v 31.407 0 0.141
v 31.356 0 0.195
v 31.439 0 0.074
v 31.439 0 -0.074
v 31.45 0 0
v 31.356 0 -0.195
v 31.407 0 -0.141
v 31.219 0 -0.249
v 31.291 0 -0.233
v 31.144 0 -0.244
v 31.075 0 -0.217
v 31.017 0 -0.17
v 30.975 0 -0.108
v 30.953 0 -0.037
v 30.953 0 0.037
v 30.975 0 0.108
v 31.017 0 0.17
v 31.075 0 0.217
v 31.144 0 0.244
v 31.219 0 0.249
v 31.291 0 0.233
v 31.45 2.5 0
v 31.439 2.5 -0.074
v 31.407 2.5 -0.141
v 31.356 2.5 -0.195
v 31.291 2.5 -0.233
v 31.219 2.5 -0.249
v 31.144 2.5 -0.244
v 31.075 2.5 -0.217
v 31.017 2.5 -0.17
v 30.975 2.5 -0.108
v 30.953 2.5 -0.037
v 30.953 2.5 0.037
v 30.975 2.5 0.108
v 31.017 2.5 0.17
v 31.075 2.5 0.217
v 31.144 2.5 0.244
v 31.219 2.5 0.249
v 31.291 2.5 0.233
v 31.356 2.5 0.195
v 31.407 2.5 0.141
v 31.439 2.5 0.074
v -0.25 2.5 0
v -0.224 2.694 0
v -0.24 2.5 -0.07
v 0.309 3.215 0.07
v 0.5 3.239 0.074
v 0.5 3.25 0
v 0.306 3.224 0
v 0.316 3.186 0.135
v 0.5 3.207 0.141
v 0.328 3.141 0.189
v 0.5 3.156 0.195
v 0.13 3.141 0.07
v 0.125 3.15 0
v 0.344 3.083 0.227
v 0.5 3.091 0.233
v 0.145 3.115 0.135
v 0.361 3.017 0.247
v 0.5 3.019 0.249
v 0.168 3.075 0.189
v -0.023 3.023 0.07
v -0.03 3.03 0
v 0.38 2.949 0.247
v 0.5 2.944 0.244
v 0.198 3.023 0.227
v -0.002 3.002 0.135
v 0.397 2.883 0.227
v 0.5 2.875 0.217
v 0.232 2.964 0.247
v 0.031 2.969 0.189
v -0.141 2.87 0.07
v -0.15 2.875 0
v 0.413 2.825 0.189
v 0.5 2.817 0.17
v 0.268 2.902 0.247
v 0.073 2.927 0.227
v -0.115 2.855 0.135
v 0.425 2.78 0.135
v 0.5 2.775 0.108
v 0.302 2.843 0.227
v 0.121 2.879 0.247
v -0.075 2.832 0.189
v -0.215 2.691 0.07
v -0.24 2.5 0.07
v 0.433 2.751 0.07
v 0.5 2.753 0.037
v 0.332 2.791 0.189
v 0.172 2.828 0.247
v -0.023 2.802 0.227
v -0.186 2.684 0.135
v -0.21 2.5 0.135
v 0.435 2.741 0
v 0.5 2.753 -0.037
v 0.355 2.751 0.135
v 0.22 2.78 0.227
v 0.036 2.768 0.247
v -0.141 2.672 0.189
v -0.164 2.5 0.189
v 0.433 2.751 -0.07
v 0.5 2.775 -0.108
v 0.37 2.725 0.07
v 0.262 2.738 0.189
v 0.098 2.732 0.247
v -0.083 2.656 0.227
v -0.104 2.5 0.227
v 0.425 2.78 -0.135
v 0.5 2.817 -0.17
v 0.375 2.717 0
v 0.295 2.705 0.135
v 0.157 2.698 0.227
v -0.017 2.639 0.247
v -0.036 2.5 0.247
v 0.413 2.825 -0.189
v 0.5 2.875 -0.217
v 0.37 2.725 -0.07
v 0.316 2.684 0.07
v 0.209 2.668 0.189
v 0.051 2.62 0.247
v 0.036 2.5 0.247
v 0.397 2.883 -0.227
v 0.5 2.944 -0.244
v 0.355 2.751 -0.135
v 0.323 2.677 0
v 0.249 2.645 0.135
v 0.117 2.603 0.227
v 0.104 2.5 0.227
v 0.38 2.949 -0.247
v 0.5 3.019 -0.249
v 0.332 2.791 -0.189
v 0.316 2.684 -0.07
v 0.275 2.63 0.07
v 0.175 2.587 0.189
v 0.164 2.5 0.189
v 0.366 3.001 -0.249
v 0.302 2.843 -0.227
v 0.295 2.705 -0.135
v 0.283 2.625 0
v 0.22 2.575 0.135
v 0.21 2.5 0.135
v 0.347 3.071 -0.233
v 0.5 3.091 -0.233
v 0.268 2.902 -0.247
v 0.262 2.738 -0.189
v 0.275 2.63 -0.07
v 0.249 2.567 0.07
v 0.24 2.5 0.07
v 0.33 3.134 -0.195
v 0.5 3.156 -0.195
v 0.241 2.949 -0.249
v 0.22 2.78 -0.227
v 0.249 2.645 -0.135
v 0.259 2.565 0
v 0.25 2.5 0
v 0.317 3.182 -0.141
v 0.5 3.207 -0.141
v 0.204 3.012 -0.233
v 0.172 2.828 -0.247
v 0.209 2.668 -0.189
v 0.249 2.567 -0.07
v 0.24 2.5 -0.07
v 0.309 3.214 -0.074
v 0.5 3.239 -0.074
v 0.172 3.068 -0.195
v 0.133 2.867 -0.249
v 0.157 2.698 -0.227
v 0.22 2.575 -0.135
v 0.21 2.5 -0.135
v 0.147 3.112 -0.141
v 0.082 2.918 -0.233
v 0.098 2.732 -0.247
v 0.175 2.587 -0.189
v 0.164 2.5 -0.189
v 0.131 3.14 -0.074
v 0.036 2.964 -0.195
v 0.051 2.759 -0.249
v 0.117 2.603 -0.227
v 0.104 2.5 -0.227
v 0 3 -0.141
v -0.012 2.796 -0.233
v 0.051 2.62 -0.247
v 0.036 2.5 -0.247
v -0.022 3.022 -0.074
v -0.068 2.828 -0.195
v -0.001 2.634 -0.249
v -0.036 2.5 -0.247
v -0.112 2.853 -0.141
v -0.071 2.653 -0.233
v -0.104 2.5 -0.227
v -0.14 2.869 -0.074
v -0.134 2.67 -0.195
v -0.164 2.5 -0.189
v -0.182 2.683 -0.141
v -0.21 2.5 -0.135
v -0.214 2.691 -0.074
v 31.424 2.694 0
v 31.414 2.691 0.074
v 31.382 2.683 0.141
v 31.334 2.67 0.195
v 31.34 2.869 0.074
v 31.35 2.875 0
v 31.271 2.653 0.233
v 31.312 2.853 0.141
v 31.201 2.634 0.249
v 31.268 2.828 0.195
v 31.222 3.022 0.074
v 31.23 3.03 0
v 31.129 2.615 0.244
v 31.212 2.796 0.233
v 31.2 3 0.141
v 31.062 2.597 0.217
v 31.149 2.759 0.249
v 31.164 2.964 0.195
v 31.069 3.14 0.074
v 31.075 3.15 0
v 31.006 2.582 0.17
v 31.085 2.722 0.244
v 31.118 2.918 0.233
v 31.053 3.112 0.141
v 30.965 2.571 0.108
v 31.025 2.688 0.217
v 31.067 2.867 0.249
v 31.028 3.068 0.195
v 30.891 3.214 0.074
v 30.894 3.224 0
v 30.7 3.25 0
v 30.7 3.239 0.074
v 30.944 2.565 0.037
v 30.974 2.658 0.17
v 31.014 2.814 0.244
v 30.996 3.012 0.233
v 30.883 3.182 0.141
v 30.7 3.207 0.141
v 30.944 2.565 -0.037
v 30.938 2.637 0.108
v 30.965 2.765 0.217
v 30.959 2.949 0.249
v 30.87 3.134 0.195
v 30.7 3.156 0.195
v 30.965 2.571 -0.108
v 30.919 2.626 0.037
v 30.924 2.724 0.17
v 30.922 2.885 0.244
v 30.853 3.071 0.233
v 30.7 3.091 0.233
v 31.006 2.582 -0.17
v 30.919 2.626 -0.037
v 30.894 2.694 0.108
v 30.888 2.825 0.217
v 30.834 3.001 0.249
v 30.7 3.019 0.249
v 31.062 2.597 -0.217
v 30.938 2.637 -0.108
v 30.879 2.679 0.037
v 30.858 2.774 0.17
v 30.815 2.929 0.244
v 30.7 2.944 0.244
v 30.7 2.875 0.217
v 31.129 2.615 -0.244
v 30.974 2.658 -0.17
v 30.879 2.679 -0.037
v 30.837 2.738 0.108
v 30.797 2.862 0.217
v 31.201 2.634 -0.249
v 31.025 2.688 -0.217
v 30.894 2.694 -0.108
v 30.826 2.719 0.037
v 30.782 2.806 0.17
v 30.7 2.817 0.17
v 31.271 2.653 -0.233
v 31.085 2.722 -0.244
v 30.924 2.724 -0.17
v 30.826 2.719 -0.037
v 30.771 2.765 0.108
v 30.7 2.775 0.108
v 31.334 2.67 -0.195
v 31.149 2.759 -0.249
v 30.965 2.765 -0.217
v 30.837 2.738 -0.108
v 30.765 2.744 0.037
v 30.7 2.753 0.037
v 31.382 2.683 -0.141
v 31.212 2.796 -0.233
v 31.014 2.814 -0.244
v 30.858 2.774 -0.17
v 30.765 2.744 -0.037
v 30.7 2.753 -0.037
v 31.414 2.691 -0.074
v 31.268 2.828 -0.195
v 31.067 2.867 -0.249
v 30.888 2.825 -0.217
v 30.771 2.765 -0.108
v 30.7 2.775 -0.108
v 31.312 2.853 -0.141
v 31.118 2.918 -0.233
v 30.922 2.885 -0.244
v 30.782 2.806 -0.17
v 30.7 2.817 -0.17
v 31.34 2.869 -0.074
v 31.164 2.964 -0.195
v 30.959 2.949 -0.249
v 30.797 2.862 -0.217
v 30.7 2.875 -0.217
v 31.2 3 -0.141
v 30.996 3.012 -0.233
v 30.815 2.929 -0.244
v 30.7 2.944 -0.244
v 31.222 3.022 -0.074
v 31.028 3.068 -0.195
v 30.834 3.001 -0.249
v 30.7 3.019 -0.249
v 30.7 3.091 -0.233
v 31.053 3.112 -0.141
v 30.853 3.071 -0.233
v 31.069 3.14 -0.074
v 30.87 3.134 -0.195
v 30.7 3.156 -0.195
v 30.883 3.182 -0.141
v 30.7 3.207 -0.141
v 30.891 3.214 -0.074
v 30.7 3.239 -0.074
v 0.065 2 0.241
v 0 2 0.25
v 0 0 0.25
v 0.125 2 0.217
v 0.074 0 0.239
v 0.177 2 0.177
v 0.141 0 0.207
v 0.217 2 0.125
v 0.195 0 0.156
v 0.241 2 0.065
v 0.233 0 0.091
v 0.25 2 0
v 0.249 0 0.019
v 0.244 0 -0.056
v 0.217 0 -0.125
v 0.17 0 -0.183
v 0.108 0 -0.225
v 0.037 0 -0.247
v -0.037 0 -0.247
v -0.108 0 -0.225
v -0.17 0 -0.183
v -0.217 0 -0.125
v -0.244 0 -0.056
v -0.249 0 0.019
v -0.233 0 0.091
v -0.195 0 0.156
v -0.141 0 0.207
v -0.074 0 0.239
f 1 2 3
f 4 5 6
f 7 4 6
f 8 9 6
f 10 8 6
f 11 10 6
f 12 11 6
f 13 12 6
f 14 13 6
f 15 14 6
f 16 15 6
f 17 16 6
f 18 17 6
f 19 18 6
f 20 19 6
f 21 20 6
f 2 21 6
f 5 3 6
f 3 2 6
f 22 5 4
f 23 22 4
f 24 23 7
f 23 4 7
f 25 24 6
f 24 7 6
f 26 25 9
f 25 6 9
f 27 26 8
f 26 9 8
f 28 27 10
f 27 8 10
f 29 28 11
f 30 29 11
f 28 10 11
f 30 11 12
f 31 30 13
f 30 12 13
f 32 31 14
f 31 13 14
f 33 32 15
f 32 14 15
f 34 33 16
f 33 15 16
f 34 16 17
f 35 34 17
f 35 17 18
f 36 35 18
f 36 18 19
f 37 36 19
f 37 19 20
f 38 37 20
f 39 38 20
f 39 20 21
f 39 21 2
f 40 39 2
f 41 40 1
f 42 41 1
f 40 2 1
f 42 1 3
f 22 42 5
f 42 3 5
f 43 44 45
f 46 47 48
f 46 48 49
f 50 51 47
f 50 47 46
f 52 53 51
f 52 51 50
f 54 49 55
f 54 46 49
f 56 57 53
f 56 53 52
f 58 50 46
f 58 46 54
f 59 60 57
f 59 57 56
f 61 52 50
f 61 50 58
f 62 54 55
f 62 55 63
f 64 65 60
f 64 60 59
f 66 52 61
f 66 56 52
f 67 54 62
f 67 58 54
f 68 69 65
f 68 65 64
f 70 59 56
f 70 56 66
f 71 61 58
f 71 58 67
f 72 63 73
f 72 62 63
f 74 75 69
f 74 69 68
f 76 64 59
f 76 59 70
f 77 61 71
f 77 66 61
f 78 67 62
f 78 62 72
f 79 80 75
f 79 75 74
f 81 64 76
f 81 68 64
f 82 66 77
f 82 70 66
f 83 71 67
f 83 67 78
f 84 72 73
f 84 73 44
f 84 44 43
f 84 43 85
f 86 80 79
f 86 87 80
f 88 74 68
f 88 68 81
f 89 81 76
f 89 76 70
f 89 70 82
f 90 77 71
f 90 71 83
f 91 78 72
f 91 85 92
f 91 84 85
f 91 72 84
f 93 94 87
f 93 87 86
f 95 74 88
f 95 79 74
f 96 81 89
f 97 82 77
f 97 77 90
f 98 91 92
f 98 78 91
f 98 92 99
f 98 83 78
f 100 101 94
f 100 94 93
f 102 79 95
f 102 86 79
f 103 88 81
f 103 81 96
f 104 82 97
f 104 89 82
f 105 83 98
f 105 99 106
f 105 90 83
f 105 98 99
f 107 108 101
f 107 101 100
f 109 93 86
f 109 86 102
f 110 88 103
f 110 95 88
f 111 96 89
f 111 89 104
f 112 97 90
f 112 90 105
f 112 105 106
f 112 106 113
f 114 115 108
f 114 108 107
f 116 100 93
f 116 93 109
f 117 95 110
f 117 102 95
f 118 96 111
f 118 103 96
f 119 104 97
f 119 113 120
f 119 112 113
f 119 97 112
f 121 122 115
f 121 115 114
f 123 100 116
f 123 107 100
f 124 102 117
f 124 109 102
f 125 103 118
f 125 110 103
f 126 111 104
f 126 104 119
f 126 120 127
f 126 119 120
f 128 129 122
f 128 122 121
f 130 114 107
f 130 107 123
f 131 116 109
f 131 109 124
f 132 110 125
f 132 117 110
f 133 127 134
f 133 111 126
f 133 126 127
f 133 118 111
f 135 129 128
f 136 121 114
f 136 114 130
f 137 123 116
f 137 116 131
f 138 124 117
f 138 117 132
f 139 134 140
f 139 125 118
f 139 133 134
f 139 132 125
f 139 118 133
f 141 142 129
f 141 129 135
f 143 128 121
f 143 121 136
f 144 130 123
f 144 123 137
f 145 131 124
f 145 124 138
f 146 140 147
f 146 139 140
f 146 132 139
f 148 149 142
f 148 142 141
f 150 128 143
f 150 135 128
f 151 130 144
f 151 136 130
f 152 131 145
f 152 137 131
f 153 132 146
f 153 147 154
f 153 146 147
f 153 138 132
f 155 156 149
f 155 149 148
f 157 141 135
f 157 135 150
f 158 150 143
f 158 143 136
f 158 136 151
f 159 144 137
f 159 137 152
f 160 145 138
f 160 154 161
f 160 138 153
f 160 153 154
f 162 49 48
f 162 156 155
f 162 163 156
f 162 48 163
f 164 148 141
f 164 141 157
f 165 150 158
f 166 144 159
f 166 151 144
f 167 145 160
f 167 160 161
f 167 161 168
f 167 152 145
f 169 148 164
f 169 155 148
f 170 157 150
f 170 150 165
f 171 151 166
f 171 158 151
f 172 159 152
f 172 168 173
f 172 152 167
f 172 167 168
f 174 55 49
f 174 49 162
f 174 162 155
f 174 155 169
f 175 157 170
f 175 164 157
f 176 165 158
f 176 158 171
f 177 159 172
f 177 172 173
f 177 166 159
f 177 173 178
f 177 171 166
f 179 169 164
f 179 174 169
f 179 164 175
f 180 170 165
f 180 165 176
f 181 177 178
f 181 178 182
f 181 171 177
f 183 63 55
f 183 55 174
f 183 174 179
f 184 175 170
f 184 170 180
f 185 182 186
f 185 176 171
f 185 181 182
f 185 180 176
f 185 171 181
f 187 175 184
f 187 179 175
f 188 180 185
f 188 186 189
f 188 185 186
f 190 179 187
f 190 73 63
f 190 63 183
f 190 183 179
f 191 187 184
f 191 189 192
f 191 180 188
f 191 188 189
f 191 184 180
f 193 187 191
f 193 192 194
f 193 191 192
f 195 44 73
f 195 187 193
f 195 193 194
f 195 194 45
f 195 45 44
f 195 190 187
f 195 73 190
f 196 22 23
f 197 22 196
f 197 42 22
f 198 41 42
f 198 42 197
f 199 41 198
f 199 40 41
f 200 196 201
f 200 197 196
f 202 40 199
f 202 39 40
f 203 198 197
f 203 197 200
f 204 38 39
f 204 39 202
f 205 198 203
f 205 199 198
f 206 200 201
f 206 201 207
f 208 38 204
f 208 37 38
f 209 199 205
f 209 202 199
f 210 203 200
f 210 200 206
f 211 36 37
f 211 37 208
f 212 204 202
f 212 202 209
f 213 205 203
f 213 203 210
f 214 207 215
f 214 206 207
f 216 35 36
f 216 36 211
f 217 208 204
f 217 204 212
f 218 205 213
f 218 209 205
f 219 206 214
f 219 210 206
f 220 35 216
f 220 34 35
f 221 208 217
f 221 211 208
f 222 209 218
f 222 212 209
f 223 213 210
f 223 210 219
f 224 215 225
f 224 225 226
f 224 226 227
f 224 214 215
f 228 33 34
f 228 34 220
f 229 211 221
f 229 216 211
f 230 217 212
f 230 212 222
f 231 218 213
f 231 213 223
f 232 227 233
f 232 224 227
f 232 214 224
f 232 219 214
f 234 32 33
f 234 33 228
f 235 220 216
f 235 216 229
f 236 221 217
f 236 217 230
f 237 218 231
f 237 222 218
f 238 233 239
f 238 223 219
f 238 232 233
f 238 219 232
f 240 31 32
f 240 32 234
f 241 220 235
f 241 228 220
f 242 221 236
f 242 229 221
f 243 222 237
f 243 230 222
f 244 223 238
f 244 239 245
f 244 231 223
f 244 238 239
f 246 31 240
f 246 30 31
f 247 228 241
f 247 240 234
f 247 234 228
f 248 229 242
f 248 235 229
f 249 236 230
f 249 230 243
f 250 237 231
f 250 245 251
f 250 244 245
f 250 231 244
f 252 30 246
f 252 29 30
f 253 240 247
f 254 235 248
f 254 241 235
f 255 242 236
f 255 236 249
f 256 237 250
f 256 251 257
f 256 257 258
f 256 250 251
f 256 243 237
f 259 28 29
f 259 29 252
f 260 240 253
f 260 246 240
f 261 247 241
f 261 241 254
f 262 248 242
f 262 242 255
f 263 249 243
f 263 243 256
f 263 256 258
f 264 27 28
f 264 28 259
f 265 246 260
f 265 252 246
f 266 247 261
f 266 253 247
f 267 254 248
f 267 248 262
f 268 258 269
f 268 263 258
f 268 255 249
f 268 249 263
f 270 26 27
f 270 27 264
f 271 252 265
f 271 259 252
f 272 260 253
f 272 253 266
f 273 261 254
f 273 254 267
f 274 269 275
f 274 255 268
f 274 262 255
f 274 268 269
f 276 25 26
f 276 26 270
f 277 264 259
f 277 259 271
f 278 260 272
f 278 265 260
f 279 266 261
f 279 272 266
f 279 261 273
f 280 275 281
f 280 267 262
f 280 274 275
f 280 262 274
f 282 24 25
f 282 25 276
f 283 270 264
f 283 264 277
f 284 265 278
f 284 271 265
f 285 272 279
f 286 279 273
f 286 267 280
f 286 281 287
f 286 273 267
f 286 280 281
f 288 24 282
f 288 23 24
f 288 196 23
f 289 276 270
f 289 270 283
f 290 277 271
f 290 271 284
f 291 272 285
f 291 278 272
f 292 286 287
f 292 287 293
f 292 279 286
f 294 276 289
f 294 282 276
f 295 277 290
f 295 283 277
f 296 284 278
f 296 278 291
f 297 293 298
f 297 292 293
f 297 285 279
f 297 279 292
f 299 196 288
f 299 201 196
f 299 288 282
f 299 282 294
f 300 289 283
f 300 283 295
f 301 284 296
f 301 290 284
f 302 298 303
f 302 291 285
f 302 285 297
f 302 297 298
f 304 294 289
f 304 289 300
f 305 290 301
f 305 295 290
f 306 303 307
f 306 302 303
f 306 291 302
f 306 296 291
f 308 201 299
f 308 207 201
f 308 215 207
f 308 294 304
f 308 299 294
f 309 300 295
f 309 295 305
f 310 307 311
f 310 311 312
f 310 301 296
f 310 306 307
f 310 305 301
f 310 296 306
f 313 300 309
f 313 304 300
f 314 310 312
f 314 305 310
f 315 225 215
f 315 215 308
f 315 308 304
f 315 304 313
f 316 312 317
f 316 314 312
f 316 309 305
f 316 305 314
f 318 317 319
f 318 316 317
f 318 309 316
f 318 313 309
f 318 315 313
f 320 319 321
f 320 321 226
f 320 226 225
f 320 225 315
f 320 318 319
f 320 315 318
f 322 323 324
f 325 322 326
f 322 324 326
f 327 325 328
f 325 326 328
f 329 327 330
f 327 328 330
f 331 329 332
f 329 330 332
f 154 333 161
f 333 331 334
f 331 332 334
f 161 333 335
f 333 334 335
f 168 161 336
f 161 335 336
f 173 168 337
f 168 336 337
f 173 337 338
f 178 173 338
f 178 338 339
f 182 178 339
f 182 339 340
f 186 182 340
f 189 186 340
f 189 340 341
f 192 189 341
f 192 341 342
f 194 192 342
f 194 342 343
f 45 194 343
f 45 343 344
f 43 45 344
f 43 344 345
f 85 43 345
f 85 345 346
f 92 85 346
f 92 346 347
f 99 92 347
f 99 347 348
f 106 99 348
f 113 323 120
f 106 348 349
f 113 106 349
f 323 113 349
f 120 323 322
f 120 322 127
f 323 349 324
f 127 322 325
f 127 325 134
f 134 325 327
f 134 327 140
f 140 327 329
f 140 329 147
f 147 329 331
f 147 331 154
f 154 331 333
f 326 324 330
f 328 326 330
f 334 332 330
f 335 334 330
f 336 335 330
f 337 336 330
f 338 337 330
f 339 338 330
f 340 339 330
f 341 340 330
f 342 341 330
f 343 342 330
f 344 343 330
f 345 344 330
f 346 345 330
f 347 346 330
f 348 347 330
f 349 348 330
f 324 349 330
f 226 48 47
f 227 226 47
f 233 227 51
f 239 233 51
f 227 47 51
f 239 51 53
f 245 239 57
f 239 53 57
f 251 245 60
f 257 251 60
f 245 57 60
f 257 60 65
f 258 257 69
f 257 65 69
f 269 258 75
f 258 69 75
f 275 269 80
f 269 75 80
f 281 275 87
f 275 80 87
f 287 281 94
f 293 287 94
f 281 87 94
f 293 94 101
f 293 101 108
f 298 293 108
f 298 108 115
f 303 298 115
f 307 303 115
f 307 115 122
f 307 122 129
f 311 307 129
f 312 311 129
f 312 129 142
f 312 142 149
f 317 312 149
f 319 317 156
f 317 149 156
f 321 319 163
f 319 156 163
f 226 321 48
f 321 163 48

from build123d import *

# Parameters (mm, degrees)
SKETCH1_R           = 0.25
BOSS_EXTRUDE1_DEPTH = 2
SWEEP1_OUTLINE_R    = 0.25
SWEEP1_DEPTH        = 2.5
SWEEP1_2_OUTLINE_R  = 0.25
SWEEP1_2_ANGLE      = 90
SWEEP1_3_OUTLINE_R  = 0.25
SWEEP1_3_ANGLE      = 90
SWEEP1_START        = 0.4999999
SWEEP1_4_OUTLINE_R  = 0.25
SWEEP1_4_DEPTH      = 30.2000002


with BuildPart() as part:
    # Sketch1 → Boss-Extrude1 (new body)
    with BuildSketch(Plane(origin=(0, 0, 0), x_dir=(1, 0, 0), z_dir=(0, 1, 0))):
        with Locations(Location((0, 0, 0), (0, 0, 270))):
            Circle(SKETCH1_R)
    extrude(amount=BOSS_EXTRUDE1_DEPTH)

    # Sweep1: read off the stored shape, not the designer's step
    # Sweep1 outline → Sweep1 (add)
    with BuildSketch(Plane(origin=(0, 0, 0), x_dir=(1, 0, 0), z_dir=(0, 1, 0))):
        Circle(SWEEP1_OUTLINE_R)
        with Locations((31.2, 0)):
            Circle(SWEEP1_OUTLINE_R)
    extrude(amount=SWEEP1_DEPTH)

    # Sweep1 2 outline → Sweep1 2 (revolve)
    with BuildSketch(Plane(origin=(0.5, 2.5, 0), x_dir=(0, 1, 0), z_dir=(1, 0, 0))):
        with Locations((0.5, 0)):
            Circle(SWEEP1_2_OUTLINE_R)
    revolve(axis=Axis((0.5, 2.5, 0), (0, 0, 1)), revolution_arc=SWEEP1_2_ANGLE)

    # Sweep1 3 outline → Sweep1 3 (revolve)
    with BuildSketch(Plane(origin=(30.7, 2.5, 0), x_dir=(1, 0, 0), z_dir=(0, -1, 0))):
        with Locations((0.5, 0)):
            Circle(SWEEP1_3_OUTLINE_R)
    revolve(axis=Axis((30.7, 2.5, 0), (0, 0, 1)), revolution_arc=SWEEP1_3_ANGLE)

    # Sweep1 4 outline → Sweep1 4 (add)
    with BuildSketch(Plane.YZ.offset(SWEEP1_START)):
        with Locations((3, 0)):
            Circle(SWEEP1_4_OUTLINE_R)
    extrude(amount=SWEEP1_4_DEPTH)


solid = part.part
